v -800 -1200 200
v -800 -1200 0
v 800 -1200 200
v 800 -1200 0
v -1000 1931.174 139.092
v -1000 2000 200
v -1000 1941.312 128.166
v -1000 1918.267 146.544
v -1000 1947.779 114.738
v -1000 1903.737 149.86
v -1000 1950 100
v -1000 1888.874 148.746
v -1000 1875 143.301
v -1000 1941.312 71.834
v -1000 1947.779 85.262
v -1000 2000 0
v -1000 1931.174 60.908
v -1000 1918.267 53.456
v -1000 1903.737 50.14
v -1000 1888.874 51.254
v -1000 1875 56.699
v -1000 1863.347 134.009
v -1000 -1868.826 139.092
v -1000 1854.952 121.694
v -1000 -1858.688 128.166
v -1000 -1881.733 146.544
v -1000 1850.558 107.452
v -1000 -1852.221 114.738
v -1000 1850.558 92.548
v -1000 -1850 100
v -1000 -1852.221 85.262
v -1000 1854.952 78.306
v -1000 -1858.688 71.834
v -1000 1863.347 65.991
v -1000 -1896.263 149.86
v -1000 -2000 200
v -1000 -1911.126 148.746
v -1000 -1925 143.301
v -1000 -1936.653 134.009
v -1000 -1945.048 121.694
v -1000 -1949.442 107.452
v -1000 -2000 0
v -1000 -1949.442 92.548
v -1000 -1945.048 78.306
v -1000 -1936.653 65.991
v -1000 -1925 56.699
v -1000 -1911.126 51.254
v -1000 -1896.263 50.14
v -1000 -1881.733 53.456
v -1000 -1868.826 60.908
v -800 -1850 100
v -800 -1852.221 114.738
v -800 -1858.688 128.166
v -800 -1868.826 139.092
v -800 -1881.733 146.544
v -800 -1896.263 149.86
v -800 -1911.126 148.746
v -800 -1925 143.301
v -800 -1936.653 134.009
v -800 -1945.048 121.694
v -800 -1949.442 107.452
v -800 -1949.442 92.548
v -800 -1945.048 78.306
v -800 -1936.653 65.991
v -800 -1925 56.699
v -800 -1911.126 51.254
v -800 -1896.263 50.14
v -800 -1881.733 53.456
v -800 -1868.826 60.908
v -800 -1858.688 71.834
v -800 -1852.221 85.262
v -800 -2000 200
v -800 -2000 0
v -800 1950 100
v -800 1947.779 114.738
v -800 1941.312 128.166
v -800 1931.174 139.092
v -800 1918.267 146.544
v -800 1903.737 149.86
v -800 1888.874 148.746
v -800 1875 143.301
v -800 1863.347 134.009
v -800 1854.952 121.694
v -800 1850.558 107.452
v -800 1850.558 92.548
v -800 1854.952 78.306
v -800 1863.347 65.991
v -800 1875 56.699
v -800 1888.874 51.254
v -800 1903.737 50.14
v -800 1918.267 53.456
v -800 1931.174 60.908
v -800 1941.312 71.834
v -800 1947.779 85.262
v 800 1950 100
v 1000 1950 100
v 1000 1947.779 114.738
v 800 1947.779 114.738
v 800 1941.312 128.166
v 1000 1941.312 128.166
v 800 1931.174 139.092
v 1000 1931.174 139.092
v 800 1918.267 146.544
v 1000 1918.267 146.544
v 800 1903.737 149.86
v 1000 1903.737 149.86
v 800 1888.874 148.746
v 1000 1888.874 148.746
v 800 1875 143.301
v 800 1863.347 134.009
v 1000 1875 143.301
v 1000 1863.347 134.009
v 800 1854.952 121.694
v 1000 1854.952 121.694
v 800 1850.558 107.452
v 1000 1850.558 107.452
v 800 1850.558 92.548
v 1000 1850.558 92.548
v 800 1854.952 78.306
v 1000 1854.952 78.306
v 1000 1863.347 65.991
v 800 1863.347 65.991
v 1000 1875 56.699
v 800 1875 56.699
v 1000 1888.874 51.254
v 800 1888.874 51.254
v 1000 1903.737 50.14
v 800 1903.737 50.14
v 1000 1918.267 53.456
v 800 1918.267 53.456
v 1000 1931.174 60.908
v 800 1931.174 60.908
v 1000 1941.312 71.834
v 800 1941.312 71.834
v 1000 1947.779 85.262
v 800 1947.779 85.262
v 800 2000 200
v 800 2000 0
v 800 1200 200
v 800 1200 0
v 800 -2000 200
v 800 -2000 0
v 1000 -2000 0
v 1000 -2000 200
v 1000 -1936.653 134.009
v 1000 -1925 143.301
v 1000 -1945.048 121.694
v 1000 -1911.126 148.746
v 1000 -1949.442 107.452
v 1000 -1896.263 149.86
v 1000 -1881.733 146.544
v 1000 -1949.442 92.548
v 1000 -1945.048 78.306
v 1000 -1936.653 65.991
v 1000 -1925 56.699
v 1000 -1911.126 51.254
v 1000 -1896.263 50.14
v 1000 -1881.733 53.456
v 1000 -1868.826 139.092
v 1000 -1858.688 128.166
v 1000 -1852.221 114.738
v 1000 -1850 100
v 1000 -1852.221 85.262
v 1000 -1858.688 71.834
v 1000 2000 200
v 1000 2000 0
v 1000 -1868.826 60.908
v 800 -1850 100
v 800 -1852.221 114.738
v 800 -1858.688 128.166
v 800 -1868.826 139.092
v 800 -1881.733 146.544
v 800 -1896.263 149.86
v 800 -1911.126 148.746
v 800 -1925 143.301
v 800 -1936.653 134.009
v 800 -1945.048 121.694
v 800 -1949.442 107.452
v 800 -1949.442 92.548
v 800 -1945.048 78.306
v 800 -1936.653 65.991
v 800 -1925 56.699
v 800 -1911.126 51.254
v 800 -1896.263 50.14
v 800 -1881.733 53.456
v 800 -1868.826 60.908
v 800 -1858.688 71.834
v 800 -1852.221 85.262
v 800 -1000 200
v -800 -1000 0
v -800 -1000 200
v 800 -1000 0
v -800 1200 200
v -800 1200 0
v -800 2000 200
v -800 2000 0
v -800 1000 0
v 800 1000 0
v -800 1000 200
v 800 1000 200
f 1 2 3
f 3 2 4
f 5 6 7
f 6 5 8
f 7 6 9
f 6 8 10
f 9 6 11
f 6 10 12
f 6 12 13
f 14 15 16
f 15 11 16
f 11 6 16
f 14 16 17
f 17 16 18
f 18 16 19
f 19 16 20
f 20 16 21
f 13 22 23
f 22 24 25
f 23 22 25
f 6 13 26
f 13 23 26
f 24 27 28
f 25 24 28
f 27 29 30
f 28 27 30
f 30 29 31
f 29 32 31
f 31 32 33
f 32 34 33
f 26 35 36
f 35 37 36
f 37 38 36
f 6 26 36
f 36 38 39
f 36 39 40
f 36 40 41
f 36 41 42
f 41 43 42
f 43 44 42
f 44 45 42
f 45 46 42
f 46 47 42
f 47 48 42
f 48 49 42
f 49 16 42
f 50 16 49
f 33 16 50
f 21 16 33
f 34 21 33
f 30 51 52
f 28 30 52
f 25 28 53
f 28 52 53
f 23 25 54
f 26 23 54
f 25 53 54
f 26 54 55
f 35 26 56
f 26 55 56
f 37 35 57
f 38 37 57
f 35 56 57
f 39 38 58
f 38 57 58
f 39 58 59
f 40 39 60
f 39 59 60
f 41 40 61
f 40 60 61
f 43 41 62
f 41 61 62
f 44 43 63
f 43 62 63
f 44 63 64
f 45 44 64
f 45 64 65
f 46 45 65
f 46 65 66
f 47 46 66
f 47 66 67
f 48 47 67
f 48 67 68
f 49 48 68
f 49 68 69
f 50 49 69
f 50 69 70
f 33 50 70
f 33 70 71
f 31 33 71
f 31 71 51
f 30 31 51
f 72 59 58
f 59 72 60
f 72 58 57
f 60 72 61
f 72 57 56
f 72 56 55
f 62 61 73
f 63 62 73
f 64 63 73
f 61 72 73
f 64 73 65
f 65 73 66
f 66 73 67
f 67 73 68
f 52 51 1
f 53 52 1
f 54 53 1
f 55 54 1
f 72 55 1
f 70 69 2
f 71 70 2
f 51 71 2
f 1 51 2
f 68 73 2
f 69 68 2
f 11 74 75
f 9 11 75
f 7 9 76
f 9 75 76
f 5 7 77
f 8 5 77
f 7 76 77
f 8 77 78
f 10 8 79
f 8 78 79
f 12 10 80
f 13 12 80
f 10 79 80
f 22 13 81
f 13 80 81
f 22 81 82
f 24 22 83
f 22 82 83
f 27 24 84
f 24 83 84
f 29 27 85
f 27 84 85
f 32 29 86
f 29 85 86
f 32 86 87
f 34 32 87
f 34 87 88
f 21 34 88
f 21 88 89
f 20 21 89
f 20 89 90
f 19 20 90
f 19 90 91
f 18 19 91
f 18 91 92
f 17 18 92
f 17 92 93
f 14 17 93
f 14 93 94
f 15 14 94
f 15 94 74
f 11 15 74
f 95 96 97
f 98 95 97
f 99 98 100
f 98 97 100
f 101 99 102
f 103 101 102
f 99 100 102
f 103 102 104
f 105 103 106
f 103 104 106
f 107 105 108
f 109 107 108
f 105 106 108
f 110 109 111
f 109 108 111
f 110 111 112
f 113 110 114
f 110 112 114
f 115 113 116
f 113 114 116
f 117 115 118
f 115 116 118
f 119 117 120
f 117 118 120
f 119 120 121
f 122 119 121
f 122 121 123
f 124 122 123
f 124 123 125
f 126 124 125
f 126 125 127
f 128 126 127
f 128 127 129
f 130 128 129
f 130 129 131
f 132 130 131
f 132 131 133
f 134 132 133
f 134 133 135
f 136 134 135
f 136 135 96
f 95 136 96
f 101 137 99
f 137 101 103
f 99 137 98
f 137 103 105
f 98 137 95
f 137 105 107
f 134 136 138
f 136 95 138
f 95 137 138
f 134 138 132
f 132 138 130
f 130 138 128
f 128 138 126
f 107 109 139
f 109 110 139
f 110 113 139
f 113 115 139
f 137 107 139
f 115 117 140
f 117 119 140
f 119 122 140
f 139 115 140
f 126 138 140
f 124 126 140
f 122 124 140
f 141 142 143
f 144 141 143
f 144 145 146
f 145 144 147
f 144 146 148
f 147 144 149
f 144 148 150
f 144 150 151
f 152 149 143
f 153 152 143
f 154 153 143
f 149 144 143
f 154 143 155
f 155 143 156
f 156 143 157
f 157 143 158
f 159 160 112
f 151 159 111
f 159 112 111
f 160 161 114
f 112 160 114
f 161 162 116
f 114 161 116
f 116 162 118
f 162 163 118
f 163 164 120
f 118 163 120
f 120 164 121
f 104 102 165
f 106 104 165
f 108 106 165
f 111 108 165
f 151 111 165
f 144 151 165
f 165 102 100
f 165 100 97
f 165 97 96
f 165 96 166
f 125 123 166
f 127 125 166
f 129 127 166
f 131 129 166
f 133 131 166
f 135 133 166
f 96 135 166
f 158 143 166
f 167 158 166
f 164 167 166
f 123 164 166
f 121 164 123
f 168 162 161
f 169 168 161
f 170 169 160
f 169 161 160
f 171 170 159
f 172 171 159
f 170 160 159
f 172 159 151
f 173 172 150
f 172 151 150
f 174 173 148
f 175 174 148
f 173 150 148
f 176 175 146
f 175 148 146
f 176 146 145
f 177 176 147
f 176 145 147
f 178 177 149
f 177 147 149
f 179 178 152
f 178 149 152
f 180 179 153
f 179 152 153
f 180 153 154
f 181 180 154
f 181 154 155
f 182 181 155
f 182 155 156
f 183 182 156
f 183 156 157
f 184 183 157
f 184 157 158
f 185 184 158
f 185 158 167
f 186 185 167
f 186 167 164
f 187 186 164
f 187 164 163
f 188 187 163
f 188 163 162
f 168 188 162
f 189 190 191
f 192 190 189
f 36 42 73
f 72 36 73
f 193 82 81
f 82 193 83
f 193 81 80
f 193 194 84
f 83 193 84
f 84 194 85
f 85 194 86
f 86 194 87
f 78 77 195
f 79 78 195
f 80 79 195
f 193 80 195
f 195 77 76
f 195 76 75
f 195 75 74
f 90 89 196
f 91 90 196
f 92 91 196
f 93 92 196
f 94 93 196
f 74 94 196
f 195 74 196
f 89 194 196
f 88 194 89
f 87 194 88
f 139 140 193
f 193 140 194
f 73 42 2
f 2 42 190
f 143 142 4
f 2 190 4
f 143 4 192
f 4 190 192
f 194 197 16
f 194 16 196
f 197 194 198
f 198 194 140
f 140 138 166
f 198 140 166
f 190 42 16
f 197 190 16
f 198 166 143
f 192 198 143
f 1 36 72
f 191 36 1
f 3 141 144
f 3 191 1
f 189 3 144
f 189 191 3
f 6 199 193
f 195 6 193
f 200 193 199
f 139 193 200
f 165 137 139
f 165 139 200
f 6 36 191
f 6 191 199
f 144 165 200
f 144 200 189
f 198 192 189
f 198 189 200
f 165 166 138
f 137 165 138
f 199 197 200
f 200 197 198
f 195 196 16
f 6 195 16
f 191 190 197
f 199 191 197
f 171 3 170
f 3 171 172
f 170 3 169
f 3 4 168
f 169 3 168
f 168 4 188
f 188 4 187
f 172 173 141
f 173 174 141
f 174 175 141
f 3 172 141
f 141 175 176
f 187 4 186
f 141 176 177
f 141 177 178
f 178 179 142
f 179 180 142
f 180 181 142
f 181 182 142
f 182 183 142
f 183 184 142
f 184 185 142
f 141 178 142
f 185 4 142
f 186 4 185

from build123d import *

# Parameters (mm, degrees)
F0_W     = 1600
F0_H     = 2000
F1_DEPTH = 200
F3_D     = 100


with BuildPart() as f1:
    # F0 (on Top) → F1 (new body)
    with BuildSketch(Plane.XY):
        Polygon((-800, 2000), (-1000, 2000), (-1000, -2000), (-800, -2000), (-800, -1200), (800, -1200), (800, -2000), (1000, -2000), (1000, 2000), (800, 2000), (800, 1200), (-800, 1200), align=None)
        Rectangle(F0_W, F0_H, mode=Mode.SUBTRACT)
    extrude(amount=F1_DEPTH)

    # F3 (through all)
    with Locations(Plane(origin=(-1000, 0, 0), x_dir=(0, -1, 0), z_dir=(-1, 0, 0))):
        with Locations((-1900, 100), (1900, 100)):
            Hole(F3_D / 2)


solid = f1.part
